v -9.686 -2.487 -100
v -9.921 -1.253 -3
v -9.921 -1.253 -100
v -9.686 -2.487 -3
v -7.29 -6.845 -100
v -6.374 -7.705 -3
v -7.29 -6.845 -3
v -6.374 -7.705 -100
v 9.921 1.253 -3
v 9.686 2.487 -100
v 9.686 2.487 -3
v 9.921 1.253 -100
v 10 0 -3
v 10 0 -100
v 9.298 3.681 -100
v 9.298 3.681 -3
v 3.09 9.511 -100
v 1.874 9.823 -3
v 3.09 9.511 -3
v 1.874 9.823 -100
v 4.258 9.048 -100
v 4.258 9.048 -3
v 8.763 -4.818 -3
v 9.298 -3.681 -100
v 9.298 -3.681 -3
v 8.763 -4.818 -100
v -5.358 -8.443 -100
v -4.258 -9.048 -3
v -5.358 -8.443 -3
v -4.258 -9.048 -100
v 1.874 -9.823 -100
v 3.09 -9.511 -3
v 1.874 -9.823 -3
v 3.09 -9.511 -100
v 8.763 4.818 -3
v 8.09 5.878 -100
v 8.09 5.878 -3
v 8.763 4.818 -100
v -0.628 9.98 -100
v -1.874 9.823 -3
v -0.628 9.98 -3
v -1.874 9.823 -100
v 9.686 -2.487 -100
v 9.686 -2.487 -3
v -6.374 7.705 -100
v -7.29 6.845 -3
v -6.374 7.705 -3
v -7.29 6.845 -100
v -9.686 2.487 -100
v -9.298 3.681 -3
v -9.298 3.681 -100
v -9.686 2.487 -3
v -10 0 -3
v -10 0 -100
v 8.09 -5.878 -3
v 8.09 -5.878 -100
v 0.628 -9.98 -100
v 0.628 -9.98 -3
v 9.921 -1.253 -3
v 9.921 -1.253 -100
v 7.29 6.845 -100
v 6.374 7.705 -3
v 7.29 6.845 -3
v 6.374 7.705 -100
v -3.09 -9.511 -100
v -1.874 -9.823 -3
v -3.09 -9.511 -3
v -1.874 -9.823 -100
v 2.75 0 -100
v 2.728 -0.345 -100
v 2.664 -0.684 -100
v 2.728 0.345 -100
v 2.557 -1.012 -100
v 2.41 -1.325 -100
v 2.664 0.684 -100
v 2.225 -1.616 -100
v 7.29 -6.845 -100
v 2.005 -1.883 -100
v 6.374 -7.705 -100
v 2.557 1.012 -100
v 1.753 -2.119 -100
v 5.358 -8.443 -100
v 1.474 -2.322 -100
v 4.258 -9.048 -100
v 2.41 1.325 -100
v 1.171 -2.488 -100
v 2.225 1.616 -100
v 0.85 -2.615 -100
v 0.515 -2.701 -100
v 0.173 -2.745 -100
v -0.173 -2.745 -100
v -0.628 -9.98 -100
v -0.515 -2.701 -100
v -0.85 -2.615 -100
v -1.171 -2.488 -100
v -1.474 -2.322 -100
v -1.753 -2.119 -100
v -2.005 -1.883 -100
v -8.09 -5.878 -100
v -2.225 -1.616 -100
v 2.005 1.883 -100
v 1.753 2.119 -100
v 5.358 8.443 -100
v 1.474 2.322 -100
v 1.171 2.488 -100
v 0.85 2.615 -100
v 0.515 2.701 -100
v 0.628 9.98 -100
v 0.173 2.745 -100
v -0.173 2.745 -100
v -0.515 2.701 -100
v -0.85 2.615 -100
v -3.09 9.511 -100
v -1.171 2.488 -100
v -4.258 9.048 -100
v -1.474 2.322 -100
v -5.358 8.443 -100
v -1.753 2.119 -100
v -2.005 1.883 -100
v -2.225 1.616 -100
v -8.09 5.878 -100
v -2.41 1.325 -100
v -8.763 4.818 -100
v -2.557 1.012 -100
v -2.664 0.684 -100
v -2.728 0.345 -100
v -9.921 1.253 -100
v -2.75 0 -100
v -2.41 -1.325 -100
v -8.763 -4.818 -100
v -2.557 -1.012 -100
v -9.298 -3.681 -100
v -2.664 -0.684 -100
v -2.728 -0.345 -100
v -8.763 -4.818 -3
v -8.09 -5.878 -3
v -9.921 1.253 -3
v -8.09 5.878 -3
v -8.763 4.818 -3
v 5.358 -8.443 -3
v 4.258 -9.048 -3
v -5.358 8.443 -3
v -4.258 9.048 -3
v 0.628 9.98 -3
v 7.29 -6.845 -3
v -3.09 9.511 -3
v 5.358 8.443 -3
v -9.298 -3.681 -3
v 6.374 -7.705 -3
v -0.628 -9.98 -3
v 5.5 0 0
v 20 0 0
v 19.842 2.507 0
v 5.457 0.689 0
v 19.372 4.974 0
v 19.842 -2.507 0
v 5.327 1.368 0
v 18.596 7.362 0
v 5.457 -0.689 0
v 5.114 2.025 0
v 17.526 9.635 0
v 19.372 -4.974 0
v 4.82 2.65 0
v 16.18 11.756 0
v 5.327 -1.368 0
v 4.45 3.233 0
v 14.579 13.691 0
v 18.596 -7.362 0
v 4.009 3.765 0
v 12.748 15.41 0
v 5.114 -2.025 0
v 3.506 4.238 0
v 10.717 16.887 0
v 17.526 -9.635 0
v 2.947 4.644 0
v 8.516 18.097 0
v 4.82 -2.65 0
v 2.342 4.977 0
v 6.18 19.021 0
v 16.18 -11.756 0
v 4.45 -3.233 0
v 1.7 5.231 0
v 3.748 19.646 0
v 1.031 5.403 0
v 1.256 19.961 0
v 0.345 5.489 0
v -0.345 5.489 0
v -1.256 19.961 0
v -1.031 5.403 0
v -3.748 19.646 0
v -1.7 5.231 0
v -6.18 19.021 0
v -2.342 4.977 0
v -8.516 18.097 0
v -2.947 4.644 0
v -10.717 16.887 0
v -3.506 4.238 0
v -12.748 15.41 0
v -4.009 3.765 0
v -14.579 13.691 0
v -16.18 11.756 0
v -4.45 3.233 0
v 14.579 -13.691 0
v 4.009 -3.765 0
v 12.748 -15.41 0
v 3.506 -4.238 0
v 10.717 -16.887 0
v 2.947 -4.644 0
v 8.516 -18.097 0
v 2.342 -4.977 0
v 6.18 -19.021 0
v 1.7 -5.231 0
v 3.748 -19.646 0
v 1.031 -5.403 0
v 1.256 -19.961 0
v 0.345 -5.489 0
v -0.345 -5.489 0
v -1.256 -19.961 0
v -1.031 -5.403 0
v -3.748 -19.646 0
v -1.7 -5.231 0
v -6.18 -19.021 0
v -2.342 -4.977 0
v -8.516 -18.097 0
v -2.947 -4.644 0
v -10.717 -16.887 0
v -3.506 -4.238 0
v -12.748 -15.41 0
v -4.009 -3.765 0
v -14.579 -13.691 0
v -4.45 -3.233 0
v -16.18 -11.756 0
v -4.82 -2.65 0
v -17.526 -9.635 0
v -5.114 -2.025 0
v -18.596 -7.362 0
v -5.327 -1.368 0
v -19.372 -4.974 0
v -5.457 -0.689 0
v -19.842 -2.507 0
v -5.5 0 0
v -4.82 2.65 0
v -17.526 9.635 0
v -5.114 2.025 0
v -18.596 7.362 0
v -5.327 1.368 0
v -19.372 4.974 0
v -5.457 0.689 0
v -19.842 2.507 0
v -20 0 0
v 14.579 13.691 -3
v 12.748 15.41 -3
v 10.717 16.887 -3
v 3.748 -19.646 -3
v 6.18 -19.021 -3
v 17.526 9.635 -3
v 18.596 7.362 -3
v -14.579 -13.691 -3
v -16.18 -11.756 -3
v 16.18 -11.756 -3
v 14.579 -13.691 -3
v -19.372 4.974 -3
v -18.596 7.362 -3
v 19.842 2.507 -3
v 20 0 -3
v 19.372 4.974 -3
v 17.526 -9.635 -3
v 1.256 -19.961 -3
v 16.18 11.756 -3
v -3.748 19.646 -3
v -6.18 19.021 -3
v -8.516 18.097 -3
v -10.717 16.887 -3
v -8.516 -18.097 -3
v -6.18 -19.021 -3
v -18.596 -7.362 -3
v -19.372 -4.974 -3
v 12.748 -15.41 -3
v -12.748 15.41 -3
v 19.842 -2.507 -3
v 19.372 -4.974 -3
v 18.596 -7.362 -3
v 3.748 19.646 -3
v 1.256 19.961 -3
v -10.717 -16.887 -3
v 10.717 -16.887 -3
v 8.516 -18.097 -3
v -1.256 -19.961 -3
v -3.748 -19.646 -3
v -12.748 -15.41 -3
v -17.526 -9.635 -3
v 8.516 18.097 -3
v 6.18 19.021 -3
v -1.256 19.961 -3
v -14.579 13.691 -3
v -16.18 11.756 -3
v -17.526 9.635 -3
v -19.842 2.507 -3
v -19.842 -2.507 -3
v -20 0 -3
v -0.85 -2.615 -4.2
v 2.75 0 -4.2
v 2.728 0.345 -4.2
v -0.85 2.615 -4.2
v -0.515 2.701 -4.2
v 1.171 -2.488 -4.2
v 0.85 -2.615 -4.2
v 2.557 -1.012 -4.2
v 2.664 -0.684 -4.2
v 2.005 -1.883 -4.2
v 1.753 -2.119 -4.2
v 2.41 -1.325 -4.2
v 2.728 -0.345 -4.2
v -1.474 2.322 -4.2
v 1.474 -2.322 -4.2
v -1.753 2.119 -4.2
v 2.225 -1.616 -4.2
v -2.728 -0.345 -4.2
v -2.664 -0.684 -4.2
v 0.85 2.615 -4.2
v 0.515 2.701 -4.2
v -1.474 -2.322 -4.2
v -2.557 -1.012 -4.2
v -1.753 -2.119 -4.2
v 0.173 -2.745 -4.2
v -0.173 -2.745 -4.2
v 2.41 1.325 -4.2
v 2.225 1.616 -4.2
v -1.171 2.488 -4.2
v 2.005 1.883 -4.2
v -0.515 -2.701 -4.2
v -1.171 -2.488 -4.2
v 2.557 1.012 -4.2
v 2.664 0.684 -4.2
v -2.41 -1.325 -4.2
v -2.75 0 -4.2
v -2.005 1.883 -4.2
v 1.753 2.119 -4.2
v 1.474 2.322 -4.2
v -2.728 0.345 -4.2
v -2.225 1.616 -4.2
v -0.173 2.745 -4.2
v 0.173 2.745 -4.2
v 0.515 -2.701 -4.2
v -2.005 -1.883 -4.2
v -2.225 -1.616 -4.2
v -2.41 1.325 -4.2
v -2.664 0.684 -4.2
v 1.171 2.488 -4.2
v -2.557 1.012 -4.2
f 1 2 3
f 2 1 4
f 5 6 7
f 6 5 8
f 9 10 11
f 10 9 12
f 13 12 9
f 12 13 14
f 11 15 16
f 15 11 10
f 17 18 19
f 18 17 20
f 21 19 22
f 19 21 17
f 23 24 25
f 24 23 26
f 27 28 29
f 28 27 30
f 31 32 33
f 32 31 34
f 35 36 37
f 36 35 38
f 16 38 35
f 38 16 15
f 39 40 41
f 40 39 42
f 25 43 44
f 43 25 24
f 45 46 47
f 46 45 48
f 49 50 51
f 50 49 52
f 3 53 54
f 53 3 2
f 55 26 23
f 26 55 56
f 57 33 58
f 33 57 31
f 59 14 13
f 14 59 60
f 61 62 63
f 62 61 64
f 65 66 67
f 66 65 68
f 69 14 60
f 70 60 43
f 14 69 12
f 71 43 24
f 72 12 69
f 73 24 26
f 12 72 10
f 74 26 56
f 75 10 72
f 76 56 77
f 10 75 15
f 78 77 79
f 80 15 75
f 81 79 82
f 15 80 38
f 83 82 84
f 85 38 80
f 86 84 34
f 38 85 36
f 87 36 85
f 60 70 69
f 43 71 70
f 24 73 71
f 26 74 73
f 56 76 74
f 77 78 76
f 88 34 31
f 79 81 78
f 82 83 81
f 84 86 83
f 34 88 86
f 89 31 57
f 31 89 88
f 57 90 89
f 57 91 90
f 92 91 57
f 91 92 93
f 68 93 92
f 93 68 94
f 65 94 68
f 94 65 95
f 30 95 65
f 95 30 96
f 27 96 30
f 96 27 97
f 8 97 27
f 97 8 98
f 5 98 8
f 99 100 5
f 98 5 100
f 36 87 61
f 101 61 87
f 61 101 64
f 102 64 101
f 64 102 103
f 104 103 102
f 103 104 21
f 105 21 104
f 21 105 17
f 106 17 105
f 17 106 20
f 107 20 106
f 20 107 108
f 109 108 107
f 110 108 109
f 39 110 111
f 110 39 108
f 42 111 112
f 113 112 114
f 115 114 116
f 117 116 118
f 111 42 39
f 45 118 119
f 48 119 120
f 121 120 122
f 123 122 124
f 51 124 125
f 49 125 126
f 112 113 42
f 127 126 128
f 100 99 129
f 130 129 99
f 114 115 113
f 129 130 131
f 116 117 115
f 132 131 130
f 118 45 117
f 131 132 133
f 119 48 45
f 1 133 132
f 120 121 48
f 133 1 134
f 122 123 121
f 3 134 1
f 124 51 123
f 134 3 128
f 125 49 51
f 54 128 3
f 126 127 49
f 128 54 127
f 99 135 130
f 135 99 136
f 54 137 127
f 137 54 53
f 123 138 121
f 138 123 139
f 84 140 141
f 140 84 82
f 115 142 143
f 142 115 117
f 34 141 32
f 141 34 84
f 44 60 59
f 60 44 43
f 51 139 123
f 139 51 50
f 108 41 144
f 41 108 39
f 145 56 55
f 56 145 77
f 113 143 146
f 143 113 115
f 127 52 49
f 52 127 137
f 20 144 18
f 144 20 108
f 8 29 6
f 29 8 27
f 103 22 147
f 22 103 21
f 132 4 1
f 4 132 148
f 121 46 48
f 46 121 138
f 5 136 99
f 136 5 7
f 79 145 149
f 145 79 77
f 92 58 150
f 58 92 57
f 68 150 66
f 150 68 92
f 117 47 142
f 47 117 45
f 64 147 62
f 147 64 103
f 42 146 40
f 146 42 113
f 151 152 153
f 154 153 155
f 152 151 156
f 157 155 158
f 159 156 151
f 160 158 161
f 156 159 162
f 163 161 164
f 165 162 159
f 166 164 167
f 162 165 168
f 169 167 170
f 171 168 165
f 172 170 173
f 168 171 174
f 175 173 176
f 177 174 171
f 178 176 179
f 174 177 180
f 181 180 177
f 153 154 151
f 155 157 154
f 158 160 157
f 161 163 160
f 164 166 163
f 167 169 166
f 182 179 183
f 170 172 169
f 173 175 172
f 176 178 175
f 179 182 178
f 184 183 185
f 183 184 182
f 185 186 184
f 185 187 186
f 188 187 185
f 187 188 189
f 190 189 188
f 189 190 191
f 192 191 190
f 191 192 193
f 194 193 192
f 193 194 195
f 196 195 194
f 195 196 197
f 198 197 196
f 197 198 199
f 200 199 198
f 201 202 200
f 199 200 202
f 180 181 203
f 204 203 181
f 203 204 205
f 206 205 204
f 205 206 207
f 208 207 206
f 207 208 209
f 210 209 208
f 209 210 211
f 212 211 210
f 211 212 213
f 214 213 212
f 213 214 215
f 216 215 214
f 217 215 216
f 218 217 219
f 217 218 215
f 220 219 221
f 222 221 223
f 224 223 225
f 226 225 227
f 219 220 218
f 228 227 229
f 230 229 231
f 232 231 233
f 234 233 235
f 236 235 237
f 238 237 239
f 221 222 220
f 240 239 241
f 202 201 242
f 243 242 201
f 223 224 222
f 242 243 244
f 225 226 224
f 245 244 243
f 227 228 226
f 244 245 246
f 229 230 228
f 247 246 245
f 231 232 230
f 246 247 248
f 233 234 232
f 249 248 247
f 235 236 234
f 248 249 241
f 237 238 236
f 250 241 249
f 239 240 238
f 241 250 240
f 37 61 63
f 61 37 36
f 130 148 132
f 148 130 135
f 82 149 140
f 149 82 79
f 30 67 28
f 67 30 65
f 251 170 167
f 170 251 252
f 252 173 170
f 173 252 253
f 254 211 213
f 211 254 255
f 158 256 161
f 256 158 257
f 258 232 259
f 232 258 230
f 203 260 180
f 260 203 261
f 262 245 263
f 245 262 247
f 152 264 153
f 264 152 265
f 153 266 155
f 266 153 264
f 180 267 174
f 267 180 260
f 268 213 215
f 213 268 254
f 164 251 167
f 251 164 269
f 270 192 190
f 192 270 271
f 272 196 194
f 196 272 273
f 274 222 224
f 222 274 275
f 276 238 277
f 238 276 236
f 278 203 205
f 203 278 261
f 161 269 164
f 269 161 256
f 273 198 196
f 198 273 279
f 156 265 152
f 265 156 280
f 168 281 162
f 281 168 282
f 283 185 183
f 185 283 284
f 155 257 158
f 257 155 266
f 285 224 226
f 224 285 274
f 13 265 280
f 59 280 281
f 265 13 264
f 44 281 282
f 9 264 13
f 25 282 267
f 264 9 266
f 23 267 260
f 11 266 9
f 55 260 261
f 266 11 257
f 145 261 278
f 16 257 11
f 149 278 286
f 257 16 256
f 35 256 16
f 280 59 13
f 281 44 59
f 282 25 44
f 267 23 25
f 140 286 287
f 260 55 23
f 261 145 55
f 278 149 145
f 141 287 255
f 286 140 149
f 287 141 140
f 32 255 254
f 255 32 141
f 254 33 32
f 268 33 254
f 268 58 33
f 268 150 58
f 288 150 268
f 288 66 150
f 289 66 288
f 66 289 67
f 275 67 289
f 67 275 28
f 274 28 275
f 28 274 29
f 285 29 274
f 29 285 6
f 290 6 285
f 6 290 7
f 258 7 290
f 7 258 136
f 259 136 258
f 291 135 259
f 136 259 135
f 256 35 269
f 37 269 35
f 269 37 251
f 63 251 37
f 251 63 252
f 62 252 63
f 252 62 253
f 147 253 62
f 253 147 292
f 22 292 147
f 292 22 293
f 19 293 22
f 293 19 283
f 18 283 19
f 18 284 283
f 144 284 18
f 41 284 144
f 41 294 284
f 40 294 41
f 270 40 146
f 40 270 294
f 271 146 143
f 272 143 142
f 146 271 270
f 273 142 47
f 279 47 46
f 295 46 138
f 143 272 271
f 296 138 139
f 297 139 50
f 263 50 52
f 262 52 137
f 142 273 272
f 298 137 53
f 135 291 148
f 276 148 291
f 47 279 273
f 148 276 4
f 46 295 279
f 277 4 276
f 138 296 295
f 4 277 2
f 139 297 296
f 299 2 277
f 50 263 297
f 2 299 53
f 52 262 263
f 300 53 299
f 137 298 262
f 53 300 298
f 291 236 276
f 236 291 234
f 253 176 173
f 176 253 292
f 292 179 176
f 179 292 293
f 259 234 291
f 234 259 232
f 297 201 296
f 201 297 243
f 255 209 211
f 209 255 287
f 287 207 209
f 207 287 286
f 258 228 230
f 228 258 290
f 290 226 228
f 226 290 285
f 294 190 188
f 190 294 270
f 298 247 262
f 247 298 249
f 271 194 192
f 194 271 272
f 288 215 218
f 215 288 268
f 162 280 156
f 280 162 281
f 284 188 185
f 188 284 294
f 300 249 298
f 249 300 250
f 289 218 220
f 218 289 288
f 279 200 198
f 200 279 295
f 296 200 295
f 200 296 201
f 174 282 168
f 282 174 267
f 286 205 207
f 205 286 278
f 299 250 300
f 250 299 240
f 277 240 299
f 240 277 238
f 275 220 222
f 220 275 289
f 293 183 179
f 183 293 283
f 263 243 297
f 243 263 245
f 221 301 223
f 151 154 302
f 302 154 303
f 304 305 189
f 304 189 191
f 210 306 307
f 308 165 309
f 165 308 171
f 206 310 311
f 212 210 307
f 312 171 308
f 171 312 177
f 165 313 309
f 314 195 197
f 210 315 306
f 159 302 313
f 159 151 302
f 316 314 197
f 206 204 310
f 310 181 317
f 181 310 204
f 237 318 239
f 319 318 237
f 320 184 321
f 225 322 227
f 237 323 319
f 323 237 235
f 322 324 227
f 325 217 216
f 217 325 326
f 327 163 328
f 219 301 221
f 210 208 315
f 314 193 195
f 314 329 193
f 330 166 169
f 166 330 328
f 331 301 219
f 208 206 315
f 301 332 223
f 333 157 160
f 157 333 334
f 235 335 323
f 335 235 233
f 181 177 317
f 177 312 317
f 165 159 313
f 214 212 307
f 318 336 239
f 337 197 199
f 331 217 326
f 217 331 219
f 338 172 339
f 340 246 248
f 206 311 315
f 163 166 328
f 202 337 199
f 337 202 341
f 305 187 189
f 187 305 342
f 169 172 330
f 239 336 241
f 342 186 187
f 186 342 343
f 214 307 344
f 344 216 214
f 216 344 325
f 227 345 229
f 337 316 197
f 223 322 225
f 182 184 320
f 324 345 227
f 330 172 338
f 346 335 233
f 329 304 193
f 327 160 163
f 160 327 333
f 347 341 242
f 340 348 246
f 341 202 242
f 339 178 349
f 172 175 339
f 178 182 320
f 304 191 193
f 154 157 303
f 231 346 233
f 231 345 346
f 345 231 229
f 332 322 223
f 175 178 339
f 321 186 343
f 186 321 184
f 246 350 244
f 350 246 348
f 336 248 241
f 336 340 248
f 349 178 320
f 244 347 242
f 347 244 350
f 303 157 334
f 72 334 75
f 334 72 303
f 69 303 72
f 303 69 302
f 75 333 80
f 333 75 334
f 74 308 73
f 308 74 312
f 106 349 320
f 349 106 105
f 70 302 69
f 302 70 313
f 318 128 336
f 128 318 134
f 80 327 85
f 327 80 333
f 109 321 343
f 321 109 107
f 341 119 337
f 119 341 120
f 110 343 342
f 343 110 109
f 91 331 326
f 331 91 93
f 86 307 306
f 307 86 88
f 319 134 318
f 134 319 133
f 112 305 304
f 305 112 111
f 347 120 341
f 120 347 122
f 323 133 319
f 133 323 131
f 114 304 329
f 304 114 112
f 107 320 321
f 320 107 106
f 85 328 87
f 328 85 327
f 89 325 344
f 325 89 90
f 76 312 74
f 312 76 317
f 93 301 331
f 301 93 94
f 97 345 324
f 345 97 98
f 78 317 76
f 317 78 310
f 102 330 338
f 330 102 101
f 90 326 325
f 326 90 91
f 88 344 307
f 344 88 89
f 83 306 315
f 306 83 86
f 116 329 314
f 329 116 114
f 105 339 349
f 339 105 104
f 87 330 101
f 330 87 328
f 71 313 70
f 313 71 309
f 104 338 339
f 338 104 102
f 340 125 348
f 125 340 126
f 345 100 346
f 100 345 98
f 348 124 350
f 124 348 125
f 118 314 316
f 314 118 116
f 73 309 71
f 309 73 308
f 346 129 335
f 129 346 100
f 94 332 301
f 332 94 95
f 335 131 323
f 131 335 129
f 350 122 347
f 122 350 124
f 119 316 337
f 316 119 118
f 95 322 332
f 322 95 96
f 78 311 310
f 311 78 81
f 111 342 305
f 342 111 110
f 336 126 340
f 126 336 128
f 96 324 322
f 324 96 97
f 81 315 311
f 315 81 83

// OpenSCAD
$fn = 50;


difference() {
	union() {
		translate(v = [0, 0, -100.0000000000]) {
			cylinder(h = 100, r = 10.0000000000);
		}
		translate(v = [0, 0, -3.0000000000]) {
			cylinder(h = 3, r = 20.0000000000);
		}
	}
	union() {
		translate(v = [0, 0, 0]) {
			rotate(a = [0, 0, 0]) {
				difference() {
					union() {
						#translate(v = [0, 0, -100.0000000000]) {
							cylinder(h = 100, r = 2.2500000000);
						}
						#translate(v = [0, 0, -4.2000000000]) {
							cylinder(h = 4.2000000000, r = 10.0000000000, r1 = 2.7500000000, r2 = 5.5000000000);
						}
						#translate(v = [0, 0, -100.0000000000]) {
							cylinder(h = 100, r = 2.7500000000);
						}
						#translate(v = [0, 0, -100.0000000000]) {
							cylinder(h = 100, r = 2.2500000000);
						}
					}
					union();
				}
			}
		}
	}
}
